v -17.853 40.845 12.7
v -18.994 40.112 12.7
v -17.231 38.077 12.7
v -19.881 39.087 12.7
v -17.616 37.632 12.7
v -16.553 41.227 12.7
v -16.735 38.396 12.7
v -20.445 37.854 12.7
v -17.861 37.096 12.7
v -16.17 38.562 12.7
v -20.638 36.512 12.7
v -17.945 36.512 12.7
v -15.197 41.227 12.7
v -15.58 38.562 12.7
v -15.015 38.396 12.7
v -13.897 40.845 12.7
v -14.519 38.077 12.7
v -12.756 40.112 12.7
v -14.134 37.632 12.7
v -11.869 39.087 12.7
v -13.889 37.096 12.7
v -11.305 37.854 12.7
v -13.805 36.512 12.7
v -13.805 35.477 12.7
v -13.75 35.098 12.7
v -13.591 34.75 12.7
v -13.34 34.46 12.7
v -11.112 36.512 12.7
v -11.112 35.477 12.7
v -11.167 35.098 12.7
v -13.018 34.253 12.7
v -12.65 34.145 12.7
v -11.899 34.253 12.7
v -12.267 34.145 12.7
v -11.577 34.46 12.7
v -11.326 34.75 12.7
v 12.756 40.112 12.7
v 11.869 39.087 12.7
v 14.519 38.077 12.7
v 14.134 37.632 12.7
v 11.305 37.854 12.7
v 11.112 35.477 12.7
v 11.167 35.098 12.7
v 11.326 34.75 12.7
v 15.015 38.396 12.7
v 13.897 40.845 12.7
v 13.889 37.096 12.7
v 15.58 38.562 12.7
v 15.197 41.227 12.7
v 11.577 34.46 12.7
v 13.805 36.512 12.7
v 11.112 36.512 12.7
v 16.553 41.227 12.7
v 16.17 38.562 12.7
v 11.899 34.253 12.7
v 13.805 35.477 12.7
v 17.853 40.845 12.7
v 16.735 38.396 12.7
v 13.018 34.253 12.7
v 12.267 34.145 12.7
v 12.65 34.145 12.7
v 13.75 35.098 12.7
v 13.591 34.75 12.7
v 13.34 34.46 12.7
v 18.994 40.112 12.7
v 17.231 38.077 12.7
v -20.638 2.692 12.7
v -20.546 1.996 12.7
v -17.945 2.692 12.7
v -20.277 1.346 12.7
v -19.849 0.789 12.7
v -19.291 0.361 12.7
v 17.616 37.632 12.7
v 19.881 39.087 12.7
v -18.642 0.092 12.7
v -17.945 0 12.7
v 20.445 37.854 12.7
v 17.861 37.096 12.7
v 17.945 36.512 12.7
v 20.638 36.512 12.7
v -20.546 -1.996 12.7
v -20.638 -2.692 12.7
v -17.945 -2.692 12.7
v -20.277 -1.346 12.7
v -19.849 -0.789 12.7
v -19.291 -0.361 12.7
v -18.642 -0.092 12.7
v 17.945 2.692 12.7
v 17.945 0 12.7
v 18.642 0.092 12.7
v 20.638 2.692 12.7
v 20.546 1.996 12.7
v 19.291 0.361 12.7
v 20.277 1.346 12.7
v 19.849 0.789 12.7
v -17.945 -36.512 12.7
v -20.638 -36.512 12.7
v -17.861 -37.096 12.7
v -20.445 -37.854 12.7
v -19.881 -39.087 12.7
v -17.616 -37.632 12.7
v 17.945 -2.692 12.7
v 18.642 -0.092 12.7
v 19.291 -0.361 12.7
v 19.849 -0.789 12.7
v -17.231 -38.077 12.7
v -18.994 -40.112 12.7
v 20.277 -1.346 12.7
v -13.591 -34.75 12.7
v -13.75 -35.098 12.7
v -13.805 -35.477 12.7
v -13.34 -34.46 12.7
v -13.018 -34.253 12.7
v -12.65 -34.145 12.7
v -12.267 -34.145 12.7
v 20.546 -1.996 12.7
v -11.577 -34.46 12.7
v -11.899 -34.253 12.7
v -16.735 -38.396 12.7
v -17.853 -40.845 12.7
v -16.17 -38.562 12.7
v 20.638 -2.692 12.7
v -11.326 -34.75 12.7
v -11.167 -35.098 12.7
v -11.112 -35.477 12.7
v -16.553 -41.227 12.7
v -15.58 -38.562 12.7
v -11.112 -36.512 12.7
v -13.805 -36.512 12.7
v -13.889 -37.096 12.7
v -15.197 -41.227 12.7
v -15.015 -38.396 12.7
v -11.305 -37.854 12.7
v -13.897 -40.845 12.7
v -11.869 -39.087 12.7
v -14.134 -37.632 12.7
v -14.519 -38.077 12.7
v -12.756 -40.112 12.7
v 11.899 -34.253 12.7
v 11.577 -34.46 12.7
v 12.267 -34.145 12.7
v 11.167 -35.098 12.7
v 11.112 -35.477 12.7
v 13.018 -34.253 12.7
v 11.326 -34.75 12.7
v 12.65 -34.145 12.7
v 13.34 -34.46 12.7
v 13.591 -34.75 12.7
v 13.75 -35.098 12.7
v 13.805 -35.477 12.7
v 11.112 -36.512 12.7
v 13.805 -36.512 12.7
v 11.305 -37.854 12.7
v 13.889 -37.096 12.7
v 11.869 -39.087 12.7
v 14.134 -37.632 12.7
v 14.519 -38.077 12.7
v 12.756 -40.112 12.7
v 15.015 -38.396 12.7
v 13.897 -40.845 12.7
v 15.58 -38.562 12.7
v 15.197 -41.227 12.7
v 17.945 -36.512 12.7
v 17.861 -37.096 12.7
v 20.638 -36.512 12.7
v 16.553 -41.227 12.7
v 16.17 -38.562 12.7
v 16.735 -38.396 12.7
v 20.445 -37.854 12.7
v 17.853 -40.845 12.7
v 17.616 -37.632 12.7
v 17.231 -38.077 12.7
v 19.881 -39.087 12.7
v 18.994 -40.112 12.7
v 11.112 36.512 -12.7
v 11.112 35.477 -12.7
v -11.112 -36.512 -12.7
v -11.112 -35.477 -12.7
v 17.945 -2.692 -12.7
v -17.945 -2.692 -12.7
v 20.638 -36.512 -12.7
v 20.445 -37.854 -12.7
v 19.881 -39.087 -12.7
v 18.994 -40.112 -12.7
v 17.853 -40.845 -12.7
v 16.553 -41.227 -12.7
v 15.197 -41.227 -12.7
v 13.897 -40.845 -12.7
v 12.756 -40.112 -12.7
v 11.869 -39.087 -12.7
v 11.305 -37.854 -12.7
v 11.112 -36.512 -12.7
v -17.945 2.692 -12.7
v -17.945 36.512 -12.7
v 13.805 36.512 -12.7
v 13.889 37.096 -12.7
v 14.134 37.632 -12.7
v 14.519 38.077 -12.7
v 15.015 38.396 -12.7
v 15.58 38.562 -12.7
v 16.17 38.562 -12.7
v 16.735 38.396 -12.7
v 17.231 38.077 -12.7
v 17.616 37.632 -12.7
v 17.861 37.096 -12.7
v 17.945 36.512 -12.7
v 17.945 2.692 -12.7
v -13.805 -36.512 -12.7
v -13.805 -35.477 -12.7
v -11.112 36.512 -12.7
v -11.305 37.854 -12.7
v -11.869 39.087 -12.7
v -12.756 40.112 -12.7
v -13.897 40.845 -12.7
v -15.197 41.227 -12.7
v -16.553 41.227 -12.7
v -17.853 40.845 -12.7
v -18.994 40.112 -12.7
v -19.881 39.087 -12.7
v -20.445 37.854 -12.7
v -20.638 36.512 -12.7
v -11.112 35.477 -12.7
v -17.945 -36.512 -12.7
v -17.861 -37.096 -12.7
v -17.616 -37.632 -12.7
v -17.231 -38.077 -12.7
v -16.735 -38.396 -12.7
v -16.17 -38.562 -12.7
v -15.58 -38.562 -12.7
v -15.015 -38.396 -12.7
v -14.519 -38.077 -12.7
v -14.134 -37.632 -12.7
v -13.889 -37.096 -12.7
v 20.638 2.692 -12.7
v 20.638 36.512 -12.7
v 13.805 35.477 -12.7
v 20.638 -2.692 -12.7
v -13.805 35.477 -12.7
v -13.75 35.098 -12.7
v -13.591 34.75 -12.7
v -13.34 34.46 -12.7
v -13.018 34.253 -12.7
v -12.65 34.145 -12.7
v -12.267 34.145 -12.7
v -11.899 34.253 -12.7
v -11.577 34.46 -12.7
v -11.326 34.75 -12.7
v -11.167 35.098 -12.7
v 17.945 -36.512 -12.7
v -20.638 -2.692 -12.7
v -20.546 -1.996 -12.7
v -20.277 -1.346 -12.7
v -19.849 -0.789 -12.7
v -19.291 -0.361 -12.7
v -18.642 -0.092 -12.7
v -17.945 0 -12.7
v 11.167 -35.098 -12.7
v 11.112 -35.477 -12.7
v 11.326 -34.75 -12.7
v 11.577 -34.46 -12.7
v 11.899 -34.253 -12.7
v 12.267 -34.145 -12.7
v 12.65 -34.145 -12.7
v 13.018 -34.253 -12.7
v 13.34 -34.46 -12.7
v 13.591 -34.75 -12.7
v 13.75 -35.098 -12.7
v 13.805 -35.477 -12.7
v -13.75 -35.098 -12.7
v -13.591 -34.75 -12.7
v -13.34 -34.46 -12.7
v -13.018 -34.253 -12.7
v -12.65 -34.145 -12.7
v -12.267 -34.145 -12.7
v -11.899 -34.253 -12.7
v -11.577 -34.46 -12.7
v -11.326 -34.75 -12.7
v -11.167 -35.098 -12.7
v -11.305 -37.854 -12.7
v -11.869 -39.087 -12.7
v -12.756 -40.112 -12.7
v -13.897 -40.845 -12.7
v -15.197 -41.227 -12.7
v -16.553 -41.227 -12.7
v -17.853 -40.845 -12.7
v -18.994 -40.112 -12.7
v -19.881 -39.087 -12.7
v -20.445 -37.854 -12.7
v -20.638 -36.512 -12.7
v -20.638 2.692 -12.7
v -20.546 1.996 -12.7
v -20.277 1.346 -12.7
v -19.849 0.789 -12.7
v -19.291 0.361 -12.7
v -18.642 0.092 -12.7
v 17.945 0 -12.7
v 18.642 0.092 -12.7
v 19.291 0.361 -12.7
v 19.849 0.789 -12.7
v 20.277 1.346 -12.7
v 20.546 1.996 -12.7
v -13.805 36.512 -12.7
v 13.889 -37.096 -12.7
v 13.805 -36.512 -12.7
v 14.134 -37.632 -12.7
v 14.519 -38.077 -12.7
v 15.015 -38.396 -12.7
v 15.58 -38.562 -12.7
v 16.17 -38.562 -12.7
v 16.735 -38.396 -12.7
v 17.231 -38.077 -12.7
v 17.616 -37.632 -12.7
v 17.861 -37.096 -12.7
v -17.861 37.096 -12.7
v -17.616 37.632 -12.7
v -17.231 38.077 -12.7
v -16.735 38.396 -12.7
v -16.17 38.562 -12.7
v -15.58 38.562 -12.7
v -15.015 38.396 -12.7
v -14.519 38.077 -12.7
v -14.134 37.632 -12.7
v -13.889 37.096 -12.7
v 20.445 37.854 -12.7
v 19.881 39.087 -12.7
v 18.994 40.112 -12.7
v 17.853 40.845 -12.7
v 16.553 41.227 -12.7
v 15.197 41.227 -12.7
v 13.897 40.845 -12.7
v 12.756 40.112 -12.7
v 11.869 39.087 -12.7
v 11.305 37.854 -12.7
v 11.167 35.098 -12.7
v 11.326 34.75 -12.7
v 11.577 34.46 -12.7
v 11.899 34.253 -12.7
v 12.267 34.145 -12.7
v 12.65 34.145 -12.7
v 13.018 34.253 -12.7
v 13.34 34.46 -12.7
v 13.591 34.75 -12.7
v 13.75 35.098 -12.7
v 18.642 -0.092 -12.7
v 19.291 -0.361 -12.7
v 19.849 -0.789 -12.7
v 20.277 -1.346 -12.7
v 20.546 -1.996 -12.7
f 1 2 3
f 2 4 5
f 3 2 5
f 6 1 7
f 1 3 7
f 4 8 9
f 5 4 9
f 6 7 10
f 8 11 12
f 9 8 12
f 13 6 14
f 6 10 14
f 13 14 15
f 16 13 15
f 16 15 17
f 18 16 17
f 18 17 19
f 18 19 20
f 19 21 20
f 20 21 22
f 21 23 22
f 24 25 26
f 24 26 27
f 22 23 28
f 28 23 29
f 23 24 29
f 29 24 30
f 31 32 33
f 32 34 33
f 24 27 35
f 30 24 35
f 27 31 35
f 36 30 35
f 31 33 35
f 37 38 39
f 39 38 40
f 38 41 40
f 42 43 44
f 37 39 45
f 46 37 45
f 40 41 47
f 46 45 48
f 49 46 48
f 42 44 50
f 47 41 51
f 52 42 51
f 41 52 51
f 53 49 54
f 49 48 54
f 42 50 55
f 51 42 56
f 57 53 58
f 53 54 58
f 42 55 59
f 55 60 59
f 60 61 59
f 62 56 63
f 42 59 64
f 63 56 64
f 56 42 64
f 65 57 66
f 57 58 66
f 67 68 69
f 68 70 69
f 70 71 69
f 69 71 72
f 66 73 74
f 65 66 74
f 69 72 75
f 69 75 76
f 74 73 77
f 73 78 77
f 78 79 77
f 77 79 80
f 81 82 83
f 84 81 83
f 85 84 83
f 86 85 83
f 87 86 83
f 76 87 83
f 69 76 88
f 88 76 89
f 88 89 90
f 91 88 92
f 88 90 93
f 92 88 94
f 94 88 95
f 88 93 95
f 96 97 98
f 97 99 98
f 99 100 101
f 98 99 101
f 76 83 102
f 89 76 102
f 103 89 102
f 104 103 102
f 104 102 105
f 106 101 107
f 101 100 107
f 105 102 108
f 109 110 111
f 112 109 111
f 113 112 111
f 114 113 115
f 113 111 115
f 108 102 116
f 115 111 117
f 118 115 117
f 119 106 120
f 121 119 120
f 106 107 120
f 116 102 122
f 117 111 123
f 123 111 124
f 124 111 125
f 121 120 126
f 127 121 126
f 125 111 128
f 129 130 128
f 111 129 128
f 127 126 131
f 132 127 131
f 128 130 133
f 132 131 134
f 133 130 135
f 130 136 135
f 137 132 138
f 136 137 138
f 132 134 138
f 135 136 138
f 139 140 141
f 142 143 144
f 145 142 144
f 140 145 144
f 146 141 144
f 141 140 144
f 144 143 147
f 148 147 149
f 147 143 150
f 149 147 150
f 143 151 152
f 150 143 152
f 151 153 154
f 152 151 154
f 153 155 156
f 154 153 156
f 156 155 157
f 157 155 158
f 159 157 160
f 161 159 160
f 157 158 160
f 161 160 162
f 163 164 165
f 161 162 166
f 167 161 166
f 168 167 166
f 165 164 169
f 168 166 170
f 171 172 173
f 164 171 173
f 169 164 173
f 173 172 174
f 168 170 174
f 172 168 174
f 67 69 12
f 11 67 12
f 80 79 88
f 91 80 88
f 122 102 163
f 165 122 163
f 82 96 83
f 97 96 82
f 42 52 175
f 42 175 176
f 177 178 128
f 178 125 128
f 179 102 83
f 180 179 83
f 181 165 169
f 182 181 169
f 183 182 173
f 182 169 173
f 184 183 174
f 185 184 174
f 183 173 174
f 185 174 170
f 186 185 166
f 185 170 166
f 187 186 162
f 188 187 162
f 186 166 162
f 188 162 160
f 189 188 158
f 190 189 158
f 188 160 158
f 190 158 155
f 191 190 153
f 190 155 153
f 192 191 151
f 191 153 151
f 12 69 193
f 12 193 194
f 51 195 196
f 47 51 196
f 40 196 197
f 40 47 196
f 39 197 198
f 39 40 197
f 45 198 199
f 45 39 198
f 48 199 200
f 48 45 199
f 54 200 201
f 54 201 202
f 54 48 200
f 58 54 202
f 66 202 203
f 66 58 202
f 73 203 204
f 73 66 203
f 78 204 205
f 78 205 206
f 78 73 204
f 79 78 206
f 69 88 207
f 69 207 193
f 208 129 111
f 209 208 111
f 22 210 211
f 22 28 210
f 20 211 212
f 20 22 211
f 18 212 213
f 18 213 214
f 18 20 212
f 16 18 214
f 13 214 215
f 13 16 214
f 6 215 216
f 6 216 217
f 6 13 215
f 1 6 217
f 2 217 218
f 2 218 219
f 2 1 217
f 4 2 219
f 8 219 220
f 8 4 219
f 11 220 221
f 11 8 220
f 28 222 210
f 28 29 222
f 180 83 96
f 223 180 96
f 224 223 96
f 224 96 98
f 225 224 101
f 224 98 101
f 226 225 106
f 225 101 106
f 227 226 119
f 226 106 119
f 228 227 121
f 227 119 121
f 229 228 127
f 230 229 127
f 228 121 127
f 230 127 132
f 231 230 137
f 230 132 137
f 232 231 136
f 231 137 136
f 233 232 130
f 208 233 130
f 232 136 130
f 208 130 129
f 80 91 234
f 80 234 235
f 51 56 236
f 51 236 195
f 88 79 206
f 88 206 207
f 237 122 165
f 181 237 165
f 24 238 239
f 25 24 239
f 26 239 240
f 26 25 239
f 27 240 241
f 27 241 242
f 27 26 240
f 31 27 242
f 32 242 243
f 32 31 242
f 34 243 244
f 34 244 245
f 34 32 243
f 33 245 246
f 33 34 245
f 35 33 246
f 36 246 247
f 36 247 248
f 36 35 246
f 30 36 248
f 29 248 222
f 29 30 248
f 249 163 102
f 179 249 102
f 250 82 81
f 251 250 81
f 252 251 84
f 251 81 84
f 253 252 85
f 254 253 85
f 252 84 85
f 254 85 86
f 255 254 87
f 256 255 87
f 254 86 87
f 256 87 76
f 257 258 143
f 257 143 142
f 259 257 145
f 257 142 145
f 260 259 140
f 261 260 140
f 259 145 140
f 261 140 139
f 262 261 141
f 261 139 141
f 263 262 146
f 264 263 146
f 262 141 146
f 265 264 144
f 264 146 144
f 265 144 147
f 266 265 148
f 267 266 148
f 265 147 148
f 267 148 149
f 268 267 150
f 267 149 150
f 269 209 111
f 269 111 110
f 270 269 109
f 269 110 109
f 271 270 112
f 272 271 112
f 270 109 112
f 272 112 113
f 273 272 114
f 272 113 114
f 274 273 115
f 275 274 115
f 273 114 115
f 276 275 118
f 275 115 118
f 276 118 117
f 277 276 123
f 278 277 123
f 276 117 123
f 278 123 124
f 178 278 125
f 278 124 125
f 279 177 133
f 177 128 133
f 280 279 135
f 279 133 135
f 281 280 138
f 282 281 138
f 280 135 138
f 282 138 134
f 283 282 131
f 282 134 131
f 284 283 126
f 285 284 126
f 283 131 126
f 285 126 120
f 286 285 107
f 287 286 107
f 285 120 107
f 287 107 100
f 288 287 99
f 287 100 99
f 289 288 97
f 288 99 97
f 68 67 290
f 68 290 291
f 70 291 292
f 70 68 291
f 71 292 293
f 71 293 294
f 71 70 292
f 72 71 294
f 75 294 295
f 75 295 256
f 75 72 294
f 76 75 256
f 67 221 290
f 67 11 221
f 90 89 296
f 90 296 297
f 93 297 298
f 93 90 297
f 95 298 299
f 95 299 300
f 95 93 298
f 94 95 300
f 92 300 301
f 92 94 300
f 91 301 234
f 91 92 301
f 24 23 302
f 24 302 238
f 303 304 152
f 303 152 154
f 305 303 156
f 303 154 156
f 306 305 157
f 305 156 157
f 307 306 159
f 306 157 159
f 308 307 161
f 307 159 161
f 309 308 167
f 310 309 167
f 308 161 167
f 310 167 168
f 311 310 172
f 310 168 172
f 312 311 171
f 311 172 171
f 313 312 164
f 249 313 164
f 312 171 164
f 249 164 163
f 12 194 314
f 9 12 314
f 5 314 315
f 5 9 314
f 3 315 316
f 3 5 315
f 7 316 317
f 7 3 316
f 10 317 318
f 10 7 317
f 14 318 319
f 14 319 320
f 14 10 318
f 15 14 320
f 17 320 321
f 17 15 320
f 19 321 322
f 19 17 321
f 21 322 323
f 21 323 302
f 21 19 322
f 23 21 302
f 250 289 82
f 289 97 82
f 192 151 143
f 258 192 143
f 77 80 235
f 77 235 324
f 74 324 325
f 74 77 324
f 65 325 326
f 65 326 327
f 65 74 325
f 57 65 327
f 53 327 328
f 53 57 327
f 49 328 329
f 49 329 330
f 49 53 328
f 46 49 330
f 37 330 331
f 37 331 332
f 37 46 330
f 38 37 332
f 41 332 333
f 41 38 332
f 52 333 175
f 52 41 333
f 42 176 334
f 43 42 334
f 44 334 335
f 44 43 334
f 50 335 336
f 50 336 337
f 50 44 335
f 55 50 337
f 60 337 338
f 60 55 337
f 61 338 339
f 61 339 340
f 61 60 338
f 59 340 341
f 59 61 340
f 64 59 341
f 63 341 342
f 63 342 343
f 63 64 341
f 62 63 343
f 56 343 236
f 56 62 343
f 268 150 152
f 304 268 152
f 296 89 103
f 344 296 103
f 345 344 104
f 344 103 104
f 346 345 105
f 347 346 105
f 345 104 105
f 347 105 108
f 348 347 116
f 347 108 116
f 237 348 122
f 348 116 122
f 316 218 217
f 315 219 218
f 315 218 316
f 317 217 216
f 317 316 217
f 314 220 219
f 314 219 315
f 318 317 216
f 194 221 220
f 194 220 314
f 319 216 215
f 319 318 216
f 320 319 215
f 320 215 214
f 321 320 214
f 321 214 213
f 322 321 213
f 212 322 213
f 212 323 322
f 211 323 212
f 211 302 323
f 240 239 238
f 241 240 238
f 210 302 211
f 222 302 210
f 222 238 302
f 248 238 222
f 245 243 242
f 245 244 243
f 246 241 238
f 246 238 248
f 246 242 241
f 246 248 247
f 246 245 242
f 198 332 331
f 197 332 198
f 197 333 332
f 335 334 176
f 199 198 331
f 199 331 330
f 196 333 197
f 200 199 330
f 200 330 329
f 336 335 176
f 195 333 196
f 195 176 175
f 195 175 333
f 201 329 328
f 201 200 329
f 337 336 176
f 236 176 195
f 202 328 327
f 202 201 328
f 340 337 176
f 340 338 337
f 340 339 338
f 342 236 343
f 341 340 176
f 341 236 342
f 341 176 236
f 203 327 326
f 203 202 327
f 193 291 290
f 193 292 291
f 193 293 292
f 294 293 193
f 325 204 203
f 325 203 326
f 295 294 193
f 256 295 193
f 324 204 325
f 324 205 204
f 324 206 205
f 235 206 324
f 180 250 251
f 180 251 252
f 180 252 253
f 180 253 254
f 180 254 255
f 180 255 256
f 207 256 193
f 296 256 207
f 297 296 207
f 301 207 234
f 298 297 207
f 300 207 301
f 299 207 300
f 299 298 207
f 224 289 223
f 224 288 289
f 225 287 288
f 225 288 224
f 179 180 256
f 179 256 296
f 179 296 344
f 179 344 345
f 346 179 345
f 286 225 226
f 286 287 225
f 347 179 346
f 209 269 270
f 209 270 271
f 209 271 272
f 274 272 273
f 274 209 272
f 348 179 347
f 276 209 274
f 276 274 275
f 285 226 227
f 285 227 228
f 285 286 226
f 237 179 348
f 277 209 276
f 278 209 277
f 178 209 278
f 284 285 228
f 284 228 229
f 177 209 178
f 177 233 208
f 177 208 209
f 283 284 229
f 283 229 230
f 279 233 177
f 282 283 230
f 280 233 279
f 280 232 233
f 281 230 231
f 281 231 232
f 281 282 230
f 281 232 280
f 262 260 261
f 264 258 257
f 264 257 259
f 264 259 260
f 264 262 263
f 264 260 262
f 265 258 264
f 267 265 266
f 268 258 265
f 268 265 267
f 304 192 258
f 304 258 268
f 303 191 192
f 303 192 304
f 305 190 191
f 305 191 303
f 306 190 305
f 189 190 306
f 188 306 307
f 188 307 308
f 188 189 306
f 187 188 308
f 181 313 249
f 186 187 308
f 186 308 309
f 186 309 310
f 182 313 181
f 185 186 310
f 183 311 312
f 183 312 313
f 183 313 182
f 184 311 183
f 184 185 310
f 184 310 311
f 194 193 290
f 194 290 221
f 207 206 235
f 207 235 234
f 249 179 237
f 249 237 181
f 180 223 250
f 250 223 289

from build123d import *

# Parameters (mm, degrees)
BASE_EXTRUDE_DEPTH = 12.7


with BuildPart() as part:
    # Sketch1 → Base-Extrude (new, symmetric)
    with BuildSketch(Plane.XY):
        with BuildLine():
            Line((-20.6375, 36.5125), (-20.6375, 2.6924))
            ThreePointArc((-20.6375, 2.6924), (-19.848914298, 0.788585702), (-17.9451, 0))
            Line((-17.9451, 0), (17.9451, 0))
            ThreePointArc((17.9451, 0), (19.848914298, 0.788585702), (20.6375, 2.6924))
            Line((20.6375, 2.6924), (20.6375, 36.5125))
            ThreePointArc((20.6375, 36.5125), (15.875, 41.275), (11.1125, 36.5125))
            Line((11.1125, 36.5125), (11.1125, 35.47745))
            ThreePointArc((11.1125, 35.47745), (12.4587, 34.13125), (13.8049, 35.47745))
            Line((13.8049, 35.47745), (13.8049, 36.5125))
            ThreePointArc((13.8049, 36.5125), (15.875, 38.5826), (17.9451, 36.5125))
            Line((17.9451, 36.5125), (17.9451, 2.6924))
            Line((17.9451, 2.6924), (-17.9451, 2.6924))
            Line((-17.9451, 2.6924), (-17.9451, 36.5125))
            ThreePointArc((-17.9451, 36.5125), (-15.875, 38.5826), (-13.8049, 36.5125))
            Line((-13.8049, 36.5125), (-13.8049, 35.47745))
            ThreePointArc((-13.8049, 35.47745), (-12.4587, 34.13125), (-11.1125, 35.47745))
            Line((-11.1125, 35.47745), (-11.1125, 36.5125))
            ThreePointArc((-11.1125, 36.5125), (-15.875, 41.275), (-20.6375, 36.5125))
        make_face()
    base_extrude = extrude(amount=BASE_EXTRUDE_DEPTH, both=True)

    # Mirror1: Base-Extrude across plane
    add(base_extrude.mirror(Plane.ZX))


solid = part.part
